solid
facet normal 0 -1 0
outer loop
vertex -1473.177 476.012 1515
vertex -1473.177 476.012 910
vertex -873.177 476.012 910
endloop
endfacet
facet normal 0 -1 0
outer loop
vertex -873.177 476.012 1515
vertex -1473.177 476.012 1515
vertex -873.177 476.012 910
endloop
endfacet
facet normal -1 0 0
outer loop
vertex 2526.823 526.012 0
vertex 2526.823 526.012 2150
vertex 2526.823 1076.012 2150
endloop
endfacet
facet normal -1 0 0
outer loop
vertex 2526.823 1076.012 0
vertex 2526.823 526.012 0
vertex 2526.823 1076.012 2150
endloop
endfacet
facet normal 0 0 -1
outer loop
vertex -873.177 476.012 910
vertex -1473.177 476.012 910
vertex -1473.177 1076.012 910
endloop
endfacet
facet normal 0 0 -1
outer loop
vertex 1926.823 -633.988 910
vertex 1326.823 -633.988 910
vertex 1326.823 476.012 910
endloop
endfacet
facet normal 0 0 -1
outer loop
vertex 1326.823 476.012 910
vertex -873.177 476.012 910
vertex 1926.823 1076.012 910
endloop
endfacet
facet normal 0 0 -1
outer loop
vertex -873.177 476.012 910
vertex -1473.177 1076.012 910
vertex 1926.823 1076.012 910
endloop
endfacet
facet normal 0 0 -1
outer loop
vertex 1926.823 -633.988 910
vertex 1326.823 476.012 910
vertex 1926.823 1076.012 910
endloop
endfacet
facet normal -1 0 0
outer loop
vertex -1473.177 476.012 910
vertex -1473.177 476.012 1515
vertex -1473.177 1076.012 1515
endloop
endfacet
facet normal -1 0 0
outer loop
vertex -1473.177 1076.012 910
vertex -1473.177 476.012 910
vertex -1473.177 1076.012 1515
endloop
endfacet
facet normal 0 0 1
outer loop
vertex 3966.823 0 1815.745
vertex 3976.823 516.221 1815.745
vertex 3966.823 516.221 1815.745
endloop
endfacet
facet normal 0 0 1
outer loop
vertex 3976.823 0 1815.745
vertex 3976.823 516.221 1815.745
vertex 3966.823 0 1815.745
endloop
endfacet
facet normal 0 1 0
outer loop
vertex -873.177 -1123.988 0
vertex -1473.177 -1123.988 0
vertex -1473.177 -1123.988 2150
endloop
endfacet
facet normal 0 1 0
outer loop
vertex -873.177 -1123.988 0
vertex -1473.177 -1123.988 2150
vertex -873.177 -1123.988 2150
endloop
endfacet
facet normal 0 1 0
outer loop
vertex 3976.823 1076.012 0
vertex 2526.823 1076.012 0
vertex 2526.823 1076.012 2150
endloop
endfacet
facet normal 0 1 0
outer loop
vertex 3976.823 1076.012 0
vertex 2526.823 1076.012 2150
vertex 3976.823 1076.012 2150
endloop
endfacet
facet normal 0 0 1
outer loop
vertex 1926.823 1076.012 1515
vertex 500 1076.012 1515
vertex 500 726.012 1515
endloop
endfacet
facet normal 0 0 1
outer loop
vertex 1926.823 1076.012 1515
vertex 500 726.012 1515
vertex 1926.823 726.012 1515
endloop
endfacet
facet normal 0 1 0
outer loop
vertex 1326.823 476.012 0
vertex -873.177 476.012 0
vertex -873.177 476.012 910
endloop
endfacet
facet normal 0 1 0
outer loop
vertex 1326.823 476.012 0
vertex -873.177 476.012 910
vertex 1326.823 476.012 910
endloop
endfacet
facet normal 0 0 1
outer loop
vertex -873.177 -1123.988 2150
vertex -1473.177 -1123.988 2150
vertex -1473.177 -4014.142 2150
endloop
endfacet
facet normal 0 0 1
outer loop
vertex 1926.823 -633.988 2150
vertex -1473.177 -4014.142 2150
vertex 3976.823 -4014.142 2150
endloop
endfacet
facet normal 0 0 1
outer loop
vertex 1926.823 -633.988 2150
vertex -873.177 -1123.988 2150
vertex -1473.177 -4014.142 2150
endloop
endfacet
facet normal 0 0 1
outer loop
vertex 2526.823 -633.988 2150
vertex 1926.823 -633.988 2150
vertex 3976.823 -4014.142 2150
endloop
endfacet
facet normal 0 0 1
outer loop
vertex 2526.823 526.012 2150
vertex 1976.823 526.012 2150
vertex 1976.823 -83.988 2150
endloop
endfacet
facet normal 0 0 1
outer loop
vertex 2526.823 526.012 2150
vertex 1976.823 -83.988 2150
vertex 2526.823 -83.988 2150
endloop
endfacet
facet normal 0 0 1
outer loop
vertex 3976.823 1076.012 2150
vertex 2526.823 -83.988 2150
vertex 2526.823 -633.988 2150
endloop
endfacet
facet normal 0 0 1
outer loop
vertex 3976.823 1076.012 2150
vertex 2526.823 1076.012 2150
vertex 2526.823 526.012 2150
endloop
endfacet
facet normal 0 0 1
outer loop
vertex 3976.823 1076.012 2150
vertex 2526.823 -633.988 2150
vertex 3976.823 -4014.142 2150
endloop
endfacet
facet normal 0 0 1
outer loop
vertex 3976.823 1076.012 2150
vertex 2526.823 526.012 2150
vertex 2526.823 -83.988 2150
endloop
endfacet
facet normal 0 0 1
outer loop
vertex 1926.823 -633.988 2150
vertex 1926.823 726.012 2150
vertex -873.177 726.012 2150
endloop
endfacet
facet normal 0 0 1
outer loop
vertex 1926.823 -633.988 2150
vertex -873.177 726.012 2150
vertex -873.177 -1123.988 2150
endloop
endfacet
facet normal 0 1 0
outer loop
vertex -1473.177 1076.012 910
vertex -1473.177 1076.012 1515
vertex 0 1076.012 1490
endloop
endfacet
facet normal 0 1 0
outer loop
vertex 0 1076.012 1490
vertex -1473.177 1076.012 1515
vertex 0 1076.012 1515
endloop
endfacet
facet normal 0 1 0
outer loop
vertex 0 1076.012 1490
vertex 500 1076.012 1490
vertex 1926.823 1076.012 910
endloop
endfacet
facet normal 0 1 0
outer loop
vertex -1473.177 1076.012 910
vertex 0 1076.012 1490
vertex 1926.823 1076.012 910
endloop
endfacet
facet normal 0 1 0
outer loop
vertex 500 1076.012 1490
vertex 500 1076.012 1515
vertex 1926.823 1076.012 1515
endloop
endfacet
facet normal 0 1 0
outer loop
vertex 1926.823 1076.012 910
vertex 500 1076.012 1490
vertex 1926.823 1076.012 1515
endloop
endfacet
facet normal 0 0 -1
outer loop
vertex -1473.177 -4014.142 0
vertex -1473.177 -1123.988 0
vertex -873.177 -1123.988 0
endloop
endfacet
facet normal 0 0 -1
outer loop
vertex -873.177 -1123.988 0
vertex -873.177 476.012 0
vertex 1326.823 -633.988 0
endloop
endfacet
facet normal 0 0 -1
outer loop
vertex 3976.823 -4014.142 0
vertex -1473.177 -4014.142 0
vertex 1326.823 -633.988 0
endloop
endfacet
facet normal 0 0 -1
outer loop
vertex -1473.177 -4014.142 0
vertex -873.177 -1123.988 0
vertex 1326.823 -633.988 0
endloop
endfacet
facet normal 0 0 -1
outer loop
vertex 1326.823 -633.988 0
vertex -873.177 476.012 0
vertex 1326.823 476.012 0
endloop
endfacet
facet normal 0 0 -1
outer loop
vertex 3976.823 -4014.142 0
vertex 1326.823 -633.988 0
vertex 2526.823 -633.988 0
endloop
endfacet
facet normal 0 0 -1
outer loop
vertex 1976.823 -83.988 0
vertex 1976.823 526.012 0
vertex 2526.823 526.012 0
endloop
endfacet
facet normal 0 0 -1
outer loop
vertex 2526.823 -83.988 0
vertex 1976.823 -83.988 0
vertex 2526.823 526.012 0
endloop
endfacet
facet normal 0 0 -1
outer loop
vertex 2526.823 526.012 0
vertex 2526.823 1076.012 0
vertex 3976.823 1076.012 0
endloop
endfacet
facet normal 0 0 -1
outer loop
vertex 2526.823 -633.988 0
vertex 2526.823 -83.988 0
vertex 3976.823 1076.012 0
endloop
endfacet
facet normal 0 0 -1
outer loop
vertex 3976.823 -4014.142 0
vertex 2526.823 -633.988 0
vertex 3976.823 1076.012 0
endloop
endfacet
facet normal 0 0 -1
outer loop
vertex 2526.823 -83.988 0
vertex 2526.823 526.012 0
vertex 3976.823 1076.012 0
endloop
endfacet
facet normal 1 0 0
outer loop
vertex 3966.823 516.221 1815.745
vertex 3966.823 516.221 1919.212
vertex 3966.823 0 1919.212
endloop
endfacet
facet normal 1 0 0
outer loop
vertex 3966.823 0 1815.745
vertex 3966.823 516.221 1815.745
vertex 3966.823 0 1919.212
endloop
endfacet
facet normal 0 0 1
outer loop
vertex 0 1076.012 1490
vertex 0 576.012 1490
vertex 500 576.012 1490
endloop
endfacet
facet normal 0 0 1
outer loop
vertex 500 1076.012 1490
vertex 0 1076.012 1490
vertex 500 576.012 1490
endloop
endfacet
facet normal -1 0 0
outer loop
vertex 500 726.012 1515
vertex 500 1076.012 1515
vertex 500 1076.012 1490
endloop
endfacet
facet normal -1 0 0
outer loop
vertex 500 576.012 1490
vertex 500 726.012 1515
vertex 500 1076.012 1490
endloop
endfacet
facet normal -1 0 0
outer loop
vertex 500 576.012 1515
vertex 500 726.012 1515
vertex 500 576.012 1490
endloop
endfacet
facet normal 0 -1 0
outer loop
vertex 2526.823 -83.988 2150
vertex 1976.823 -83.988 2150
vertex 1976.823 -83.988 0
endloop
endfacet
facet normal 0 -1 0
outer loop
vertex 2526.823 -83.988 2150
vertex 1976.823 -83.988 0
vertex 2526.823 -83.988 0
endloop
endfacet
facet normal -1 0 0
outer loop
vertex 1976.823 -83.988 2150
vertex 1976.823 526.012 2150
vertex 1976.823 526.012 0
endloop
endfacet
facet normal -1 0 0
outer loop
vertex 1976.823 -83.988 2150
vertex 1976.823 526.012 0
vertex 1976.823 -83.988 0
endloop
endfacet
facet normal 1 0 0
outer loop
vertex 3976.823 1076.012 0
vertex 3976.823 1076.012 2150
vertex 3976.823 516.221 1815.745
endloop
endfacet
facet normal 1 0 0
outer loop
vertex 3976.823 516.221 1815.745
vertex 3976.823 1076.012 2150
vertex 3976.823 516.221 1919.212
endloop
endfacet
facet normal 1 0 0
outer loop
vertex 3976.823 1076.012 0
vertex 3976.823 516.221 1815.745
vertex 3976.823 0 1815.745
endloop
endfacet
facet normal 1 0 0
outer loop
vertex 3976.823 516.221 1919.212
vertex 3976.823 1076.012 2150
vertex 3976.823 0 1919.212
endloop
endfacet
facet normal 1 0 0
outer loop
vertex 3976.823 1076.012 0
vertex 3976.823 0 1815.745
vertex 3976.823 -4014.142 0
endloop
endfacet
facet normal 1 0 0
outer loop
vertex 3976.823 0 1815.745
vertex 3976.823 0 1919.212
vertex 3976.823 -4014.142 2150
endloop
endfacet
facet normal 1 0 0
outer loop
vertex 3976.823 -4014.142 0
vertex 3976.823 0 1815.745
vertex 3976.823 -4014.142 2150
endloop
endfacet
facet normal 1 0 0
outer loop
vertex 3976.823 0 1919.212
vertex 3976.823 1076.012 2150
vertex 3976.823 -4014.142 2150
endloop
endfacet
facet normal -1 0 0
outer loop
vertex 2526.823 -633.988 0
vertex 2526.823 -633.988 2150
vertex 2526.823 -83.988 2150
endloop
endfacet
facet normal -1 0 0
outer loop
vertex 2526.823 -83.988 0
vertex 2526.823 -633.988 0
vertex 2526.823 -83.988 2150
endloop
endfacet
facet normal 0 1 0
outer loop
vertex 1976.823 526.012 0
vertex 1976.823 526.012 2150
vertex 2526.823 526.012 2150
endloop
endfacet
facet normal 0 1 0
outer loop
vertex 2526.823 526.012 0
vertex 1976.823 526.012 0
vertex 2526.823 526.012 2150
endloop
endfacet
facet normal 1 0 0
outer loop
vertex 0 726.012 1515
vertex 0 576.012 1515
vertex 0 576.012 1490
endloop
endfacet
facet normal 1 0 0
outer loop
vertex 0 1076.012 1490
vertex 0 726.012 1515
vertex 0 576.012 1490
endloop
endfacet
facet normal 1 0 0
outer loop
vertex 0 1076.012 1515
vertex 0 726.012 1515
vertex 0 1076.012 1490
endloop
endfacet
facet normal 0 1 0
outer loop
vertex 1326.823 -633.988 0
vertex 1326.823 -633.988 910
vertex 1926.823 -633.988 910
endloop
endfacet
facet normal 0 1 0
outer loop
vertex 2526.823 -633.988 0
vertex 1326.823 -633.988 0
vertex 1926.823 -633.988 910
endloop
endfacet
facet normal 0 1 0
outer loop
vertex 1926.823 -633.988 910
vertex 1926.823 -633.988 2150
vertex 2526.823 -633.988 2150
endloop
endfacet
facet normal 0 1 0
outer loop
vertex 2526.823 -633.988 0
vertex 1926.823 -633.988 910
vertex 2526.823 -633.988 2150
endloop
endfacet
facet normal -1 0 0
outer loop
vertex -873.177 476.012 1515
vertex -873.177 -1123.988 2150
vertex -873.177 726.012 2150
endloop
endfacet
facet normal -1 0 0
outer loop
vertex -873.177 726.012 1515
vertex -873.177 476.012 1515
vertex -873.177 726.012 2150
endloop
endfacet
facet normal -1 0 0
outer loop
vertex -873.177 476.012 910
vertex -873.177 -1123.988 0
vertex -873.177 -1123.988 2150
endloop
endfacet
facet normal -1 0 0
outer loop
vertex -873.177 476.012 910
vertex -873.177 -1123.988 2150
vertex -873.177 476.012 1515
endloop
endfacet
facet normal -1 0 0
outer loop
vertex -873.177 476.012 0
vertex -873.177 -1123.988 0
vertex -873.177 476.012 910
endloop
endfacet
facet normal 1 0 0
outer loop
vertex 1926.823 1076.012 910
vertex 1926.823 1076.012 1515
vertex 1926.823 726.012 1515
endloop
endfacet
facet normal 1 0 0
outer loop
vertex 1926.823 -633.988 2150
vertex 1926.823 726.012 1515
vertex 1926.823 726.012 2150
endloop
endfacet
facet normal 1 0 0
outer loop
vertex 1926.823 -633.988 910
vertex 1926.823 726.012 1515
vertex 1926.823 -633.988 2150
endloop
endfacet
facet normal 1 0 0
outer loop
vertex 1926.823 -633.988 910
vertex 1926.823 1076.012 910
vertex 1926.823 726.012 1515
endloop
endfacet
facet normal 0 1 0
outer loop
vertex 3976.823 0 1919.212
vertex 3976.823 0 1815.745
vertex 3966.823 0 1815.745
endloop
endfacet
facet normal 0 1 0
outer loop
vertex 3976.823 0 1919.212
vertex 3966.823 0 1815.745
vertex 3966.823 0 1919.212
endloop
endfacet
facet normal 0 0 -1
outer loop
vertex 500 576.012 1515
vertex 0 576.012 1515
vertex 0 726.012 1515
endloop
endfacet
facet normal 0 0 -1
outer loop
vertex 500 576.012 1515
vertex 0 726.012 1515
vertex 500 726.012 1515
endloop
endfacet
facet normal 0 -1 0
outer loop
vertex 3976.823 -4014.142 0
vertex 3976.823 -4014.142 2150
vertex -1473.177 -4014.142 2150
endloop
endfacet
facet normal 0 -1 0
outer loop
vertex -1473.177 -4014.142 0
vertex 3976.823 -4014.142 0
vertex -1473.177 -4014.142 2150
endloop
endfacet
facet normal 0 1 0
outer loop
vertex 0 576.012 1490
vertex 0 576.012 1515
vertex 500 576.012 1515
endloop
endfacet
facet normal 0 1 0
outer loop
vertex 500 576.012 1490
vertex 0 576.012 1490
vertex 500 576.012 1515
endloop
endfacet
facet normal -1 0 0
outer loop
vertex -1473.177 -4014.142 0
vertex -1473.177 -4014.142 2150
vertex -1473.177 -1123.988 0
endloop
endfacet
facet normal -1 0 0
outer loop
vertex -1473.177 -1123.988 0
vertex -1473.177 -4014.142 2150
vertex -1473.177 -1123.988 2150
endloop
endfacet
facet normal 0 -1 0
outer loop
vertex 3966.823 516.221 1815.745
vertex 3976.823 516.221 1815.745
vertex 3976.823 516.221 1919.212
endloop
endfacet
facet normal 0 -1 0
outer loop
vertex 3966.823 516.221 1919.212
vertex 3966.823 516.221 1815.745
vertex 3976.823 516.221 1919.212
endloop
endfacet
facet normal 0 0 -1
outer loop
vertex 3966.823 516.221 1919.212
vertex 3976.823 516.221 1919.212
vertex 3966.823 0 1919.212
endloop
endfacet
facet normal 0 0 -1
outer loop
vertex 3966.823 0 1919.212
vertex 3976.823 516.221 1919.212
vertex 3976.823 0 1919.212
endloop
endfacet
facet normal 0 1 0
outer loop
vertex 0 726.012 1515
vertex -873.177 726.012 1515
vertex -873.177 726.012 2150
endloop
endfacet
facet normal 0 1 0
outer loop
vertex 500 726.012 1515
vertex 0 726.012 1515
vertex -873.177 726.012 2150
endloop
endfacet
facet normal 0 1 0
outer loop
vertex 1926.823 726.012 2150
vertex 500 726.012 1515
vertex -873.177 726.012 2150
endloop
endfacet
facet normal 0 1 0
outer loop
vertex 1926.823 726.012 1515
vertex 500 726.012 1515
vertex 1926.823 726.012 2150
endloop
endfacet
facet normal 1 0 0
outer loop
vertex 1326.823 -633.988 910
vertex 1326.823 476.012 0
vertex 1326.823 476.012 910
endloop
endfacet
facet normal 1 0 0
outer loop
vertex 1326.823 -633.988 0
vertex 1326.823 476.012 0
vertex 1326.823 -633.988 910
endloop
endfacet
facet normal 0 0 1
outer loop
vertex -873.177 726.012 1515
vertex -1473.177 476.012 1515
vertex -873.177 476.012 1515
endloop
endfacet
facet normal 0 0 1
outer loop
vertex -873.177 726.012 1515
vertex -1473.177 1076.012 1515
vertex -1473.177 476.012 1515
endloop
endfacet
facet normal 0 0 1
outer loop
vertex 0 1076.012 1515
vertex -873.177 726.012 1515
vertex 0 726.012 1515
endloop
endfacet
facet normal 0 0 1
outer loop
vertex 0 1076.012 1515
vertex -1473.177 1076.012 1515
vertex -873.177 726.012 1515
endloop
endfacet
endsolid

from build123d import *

# Parameters (mm, degrees)
F1_DEPTH  = 910
F2_W      = 600
F2_H      = 1600
F3_DEPTH  = 605
F4_W      = 600
F4_H      = 1600
F5_DEPTH  = 635
F6_W      = 500
F6_H      = 150
F6_H_2    = 350
F7_DEPTH  = 25
F8_W      = 50
F8_H      = 1710
F9_DEPTH  = 2150
F10_W     = 550
F10_H     = 550
F11_DEPTH = 2150
F12_W     = 516.2205696106
F12_H     = 103.4668684006
F13_DEPTH = 10
F14_W     = 5881.225649956
F14_H     = 5462.1144815301
F15_DEPTH = 2150


with BuildPart() as f1:
    # F0 (on Top) → F1 (new body)
    with BuildSketch(Plane.XY):
        Polygon((-1473.1765345304, 1076.0116144037), (-1473.1765345304, -1123.9883855963), (-873.1765345304, -1123.9883855963), (-873.1765345304, 476.0116144037), (1326.8234654696, 476.0116144037), (1326.8234654696, -633.9883855963), (1926.8234654696, -633.9883855963), (1926.8234654696, 1076.0116144037), align=None)
    extrude(amount=F1_DEPTH)

    # F2 (on face) → F3 (join)
    with BuildSketch(Plane.XY.offset(910)):
        with Locations((-1173.1765345304, -323.9883855963)):
            Rectangle(F2_W, F2_H)
    extrude(amount=F3_DEPTH)

    # F4 (on face) → F5 (join)
    with BuildSketch(Plane.XY.offset(1515)):
        Polygon((-1473.1765345304, 476.0116144037), (-873.1765345304, 476.0116144037), (-873.1765345304, 726.0116144037), (1926.8234654696, 726.0116144037), (1926.8234654696, 1076.0116144037), (-1473.1765345304, 1076.0116144037), align=None)
        with Locations((-1173.1765345304, -323.9883855963)):
            Rectangle(F4_W, F4_H)
    extrude(amount=F5_DEPTH)

    # F6 (on face) → F7 (join)
    with BuildSketch(Plane(origin=(0, 0, 1515), x_dir=(1, 0, 0), z_dir=(0, 0, -1))):
        with Locations((250, -651.0116144037)):
            Rectangle(F6_W, F6_H)
        with Locations((250, -901.0116144037)):
            Rectangle(F6_W, F6_H_2)
    extrude(amount=F7_DEPTH)

    # F8 (on face) → F9 (join, through all)
    with BuildSketch(Plane(origin=(0, 0, 0), x_dir=(1, 0, 0), z_dir=(0, 0, -1))):
        with Locations((1951.8234654696, -221.0116144037)):
            Rectangle(F8_W, F8_H)
    extrude(amount=-F9_DEPTH)

    # F10 (on face) → F11 (join, through all)
    with BuildSketch(Plane.XY.offset(2150)):
        with Locations((2251.8234654696, -358.9883855963)):
            Rectangle(F10_W, F10_H)
        with Locations((2251.8234654696, 801.0116144037)):
            Rectangle(F10_W, F10_H)
        Polygon((-1473.1765345304, 1276.0116144037), (-1473.1765345304, 1076.0116144037), (1976.8234654696, 1076.0116144037), (2526.8234654696, 1076.0116144037), (3976.8234654696, 1076.0116144037), (3976.8234654696, 1276.0116144037), align=None)
        Polygon((4246.0098906786, 1276.0116144037), (3976.8234654696, 1276.0116144037), (3976.8234654696, 1076.0116144037), (3976.8234654696, -4014.142036438), (4246.0098906786, -4014.142036438), align=None)
        Polygon((3976.8234654696, -4014.142036438), (-1473.1765345304, -4014.142036438), (-1473.1765345304, -4186.1028671265), (4246.0098906786, -4186.1028671265), (4246.0098906786, -4014.142036438), align=None)
        Polygon((-1473.1765345304, -1123.9883855963), (-1473.1765345304, 1076.0116144037), (-1473.1765345304, 1276.0116144037), (-1635.2157592773, 1276.0116144037), (-1635.2157592773, -4186.1028671265), (-1473.1765345304, -4186.1028671265), (-1473.1765345304, -4014.142036438), align=None)
    extrude(amount=-F11_DEPTH)

    # F12 (on face) → F13 (join)
    with BuildSketch(Plane(origin=(3976.8234654696, 0, 0), x_dir=(0, -1, 0), z_dir=(-1, 0, 0))):
        with Locations((-258.1102848053, 1867.4786686897)):
            Rectangle(F12_W, F12_H)
    extrude(amount=F13_DEPTH)


with BuildPart() as f15:
    # F14 (on face) → F15 (new body, through all)
    with BuildSketch(Plane.XY.offset(2150)):
        with Locations((1305.3970657006, -1455.0456263614)):
            Rectangle(F14_W, F14_H)
    extrude(amount=-F15_DEPTH)

    # F16: cut F1
    add(f1.part, mode=Mode.SUBTRACT)


solid = f15.part
